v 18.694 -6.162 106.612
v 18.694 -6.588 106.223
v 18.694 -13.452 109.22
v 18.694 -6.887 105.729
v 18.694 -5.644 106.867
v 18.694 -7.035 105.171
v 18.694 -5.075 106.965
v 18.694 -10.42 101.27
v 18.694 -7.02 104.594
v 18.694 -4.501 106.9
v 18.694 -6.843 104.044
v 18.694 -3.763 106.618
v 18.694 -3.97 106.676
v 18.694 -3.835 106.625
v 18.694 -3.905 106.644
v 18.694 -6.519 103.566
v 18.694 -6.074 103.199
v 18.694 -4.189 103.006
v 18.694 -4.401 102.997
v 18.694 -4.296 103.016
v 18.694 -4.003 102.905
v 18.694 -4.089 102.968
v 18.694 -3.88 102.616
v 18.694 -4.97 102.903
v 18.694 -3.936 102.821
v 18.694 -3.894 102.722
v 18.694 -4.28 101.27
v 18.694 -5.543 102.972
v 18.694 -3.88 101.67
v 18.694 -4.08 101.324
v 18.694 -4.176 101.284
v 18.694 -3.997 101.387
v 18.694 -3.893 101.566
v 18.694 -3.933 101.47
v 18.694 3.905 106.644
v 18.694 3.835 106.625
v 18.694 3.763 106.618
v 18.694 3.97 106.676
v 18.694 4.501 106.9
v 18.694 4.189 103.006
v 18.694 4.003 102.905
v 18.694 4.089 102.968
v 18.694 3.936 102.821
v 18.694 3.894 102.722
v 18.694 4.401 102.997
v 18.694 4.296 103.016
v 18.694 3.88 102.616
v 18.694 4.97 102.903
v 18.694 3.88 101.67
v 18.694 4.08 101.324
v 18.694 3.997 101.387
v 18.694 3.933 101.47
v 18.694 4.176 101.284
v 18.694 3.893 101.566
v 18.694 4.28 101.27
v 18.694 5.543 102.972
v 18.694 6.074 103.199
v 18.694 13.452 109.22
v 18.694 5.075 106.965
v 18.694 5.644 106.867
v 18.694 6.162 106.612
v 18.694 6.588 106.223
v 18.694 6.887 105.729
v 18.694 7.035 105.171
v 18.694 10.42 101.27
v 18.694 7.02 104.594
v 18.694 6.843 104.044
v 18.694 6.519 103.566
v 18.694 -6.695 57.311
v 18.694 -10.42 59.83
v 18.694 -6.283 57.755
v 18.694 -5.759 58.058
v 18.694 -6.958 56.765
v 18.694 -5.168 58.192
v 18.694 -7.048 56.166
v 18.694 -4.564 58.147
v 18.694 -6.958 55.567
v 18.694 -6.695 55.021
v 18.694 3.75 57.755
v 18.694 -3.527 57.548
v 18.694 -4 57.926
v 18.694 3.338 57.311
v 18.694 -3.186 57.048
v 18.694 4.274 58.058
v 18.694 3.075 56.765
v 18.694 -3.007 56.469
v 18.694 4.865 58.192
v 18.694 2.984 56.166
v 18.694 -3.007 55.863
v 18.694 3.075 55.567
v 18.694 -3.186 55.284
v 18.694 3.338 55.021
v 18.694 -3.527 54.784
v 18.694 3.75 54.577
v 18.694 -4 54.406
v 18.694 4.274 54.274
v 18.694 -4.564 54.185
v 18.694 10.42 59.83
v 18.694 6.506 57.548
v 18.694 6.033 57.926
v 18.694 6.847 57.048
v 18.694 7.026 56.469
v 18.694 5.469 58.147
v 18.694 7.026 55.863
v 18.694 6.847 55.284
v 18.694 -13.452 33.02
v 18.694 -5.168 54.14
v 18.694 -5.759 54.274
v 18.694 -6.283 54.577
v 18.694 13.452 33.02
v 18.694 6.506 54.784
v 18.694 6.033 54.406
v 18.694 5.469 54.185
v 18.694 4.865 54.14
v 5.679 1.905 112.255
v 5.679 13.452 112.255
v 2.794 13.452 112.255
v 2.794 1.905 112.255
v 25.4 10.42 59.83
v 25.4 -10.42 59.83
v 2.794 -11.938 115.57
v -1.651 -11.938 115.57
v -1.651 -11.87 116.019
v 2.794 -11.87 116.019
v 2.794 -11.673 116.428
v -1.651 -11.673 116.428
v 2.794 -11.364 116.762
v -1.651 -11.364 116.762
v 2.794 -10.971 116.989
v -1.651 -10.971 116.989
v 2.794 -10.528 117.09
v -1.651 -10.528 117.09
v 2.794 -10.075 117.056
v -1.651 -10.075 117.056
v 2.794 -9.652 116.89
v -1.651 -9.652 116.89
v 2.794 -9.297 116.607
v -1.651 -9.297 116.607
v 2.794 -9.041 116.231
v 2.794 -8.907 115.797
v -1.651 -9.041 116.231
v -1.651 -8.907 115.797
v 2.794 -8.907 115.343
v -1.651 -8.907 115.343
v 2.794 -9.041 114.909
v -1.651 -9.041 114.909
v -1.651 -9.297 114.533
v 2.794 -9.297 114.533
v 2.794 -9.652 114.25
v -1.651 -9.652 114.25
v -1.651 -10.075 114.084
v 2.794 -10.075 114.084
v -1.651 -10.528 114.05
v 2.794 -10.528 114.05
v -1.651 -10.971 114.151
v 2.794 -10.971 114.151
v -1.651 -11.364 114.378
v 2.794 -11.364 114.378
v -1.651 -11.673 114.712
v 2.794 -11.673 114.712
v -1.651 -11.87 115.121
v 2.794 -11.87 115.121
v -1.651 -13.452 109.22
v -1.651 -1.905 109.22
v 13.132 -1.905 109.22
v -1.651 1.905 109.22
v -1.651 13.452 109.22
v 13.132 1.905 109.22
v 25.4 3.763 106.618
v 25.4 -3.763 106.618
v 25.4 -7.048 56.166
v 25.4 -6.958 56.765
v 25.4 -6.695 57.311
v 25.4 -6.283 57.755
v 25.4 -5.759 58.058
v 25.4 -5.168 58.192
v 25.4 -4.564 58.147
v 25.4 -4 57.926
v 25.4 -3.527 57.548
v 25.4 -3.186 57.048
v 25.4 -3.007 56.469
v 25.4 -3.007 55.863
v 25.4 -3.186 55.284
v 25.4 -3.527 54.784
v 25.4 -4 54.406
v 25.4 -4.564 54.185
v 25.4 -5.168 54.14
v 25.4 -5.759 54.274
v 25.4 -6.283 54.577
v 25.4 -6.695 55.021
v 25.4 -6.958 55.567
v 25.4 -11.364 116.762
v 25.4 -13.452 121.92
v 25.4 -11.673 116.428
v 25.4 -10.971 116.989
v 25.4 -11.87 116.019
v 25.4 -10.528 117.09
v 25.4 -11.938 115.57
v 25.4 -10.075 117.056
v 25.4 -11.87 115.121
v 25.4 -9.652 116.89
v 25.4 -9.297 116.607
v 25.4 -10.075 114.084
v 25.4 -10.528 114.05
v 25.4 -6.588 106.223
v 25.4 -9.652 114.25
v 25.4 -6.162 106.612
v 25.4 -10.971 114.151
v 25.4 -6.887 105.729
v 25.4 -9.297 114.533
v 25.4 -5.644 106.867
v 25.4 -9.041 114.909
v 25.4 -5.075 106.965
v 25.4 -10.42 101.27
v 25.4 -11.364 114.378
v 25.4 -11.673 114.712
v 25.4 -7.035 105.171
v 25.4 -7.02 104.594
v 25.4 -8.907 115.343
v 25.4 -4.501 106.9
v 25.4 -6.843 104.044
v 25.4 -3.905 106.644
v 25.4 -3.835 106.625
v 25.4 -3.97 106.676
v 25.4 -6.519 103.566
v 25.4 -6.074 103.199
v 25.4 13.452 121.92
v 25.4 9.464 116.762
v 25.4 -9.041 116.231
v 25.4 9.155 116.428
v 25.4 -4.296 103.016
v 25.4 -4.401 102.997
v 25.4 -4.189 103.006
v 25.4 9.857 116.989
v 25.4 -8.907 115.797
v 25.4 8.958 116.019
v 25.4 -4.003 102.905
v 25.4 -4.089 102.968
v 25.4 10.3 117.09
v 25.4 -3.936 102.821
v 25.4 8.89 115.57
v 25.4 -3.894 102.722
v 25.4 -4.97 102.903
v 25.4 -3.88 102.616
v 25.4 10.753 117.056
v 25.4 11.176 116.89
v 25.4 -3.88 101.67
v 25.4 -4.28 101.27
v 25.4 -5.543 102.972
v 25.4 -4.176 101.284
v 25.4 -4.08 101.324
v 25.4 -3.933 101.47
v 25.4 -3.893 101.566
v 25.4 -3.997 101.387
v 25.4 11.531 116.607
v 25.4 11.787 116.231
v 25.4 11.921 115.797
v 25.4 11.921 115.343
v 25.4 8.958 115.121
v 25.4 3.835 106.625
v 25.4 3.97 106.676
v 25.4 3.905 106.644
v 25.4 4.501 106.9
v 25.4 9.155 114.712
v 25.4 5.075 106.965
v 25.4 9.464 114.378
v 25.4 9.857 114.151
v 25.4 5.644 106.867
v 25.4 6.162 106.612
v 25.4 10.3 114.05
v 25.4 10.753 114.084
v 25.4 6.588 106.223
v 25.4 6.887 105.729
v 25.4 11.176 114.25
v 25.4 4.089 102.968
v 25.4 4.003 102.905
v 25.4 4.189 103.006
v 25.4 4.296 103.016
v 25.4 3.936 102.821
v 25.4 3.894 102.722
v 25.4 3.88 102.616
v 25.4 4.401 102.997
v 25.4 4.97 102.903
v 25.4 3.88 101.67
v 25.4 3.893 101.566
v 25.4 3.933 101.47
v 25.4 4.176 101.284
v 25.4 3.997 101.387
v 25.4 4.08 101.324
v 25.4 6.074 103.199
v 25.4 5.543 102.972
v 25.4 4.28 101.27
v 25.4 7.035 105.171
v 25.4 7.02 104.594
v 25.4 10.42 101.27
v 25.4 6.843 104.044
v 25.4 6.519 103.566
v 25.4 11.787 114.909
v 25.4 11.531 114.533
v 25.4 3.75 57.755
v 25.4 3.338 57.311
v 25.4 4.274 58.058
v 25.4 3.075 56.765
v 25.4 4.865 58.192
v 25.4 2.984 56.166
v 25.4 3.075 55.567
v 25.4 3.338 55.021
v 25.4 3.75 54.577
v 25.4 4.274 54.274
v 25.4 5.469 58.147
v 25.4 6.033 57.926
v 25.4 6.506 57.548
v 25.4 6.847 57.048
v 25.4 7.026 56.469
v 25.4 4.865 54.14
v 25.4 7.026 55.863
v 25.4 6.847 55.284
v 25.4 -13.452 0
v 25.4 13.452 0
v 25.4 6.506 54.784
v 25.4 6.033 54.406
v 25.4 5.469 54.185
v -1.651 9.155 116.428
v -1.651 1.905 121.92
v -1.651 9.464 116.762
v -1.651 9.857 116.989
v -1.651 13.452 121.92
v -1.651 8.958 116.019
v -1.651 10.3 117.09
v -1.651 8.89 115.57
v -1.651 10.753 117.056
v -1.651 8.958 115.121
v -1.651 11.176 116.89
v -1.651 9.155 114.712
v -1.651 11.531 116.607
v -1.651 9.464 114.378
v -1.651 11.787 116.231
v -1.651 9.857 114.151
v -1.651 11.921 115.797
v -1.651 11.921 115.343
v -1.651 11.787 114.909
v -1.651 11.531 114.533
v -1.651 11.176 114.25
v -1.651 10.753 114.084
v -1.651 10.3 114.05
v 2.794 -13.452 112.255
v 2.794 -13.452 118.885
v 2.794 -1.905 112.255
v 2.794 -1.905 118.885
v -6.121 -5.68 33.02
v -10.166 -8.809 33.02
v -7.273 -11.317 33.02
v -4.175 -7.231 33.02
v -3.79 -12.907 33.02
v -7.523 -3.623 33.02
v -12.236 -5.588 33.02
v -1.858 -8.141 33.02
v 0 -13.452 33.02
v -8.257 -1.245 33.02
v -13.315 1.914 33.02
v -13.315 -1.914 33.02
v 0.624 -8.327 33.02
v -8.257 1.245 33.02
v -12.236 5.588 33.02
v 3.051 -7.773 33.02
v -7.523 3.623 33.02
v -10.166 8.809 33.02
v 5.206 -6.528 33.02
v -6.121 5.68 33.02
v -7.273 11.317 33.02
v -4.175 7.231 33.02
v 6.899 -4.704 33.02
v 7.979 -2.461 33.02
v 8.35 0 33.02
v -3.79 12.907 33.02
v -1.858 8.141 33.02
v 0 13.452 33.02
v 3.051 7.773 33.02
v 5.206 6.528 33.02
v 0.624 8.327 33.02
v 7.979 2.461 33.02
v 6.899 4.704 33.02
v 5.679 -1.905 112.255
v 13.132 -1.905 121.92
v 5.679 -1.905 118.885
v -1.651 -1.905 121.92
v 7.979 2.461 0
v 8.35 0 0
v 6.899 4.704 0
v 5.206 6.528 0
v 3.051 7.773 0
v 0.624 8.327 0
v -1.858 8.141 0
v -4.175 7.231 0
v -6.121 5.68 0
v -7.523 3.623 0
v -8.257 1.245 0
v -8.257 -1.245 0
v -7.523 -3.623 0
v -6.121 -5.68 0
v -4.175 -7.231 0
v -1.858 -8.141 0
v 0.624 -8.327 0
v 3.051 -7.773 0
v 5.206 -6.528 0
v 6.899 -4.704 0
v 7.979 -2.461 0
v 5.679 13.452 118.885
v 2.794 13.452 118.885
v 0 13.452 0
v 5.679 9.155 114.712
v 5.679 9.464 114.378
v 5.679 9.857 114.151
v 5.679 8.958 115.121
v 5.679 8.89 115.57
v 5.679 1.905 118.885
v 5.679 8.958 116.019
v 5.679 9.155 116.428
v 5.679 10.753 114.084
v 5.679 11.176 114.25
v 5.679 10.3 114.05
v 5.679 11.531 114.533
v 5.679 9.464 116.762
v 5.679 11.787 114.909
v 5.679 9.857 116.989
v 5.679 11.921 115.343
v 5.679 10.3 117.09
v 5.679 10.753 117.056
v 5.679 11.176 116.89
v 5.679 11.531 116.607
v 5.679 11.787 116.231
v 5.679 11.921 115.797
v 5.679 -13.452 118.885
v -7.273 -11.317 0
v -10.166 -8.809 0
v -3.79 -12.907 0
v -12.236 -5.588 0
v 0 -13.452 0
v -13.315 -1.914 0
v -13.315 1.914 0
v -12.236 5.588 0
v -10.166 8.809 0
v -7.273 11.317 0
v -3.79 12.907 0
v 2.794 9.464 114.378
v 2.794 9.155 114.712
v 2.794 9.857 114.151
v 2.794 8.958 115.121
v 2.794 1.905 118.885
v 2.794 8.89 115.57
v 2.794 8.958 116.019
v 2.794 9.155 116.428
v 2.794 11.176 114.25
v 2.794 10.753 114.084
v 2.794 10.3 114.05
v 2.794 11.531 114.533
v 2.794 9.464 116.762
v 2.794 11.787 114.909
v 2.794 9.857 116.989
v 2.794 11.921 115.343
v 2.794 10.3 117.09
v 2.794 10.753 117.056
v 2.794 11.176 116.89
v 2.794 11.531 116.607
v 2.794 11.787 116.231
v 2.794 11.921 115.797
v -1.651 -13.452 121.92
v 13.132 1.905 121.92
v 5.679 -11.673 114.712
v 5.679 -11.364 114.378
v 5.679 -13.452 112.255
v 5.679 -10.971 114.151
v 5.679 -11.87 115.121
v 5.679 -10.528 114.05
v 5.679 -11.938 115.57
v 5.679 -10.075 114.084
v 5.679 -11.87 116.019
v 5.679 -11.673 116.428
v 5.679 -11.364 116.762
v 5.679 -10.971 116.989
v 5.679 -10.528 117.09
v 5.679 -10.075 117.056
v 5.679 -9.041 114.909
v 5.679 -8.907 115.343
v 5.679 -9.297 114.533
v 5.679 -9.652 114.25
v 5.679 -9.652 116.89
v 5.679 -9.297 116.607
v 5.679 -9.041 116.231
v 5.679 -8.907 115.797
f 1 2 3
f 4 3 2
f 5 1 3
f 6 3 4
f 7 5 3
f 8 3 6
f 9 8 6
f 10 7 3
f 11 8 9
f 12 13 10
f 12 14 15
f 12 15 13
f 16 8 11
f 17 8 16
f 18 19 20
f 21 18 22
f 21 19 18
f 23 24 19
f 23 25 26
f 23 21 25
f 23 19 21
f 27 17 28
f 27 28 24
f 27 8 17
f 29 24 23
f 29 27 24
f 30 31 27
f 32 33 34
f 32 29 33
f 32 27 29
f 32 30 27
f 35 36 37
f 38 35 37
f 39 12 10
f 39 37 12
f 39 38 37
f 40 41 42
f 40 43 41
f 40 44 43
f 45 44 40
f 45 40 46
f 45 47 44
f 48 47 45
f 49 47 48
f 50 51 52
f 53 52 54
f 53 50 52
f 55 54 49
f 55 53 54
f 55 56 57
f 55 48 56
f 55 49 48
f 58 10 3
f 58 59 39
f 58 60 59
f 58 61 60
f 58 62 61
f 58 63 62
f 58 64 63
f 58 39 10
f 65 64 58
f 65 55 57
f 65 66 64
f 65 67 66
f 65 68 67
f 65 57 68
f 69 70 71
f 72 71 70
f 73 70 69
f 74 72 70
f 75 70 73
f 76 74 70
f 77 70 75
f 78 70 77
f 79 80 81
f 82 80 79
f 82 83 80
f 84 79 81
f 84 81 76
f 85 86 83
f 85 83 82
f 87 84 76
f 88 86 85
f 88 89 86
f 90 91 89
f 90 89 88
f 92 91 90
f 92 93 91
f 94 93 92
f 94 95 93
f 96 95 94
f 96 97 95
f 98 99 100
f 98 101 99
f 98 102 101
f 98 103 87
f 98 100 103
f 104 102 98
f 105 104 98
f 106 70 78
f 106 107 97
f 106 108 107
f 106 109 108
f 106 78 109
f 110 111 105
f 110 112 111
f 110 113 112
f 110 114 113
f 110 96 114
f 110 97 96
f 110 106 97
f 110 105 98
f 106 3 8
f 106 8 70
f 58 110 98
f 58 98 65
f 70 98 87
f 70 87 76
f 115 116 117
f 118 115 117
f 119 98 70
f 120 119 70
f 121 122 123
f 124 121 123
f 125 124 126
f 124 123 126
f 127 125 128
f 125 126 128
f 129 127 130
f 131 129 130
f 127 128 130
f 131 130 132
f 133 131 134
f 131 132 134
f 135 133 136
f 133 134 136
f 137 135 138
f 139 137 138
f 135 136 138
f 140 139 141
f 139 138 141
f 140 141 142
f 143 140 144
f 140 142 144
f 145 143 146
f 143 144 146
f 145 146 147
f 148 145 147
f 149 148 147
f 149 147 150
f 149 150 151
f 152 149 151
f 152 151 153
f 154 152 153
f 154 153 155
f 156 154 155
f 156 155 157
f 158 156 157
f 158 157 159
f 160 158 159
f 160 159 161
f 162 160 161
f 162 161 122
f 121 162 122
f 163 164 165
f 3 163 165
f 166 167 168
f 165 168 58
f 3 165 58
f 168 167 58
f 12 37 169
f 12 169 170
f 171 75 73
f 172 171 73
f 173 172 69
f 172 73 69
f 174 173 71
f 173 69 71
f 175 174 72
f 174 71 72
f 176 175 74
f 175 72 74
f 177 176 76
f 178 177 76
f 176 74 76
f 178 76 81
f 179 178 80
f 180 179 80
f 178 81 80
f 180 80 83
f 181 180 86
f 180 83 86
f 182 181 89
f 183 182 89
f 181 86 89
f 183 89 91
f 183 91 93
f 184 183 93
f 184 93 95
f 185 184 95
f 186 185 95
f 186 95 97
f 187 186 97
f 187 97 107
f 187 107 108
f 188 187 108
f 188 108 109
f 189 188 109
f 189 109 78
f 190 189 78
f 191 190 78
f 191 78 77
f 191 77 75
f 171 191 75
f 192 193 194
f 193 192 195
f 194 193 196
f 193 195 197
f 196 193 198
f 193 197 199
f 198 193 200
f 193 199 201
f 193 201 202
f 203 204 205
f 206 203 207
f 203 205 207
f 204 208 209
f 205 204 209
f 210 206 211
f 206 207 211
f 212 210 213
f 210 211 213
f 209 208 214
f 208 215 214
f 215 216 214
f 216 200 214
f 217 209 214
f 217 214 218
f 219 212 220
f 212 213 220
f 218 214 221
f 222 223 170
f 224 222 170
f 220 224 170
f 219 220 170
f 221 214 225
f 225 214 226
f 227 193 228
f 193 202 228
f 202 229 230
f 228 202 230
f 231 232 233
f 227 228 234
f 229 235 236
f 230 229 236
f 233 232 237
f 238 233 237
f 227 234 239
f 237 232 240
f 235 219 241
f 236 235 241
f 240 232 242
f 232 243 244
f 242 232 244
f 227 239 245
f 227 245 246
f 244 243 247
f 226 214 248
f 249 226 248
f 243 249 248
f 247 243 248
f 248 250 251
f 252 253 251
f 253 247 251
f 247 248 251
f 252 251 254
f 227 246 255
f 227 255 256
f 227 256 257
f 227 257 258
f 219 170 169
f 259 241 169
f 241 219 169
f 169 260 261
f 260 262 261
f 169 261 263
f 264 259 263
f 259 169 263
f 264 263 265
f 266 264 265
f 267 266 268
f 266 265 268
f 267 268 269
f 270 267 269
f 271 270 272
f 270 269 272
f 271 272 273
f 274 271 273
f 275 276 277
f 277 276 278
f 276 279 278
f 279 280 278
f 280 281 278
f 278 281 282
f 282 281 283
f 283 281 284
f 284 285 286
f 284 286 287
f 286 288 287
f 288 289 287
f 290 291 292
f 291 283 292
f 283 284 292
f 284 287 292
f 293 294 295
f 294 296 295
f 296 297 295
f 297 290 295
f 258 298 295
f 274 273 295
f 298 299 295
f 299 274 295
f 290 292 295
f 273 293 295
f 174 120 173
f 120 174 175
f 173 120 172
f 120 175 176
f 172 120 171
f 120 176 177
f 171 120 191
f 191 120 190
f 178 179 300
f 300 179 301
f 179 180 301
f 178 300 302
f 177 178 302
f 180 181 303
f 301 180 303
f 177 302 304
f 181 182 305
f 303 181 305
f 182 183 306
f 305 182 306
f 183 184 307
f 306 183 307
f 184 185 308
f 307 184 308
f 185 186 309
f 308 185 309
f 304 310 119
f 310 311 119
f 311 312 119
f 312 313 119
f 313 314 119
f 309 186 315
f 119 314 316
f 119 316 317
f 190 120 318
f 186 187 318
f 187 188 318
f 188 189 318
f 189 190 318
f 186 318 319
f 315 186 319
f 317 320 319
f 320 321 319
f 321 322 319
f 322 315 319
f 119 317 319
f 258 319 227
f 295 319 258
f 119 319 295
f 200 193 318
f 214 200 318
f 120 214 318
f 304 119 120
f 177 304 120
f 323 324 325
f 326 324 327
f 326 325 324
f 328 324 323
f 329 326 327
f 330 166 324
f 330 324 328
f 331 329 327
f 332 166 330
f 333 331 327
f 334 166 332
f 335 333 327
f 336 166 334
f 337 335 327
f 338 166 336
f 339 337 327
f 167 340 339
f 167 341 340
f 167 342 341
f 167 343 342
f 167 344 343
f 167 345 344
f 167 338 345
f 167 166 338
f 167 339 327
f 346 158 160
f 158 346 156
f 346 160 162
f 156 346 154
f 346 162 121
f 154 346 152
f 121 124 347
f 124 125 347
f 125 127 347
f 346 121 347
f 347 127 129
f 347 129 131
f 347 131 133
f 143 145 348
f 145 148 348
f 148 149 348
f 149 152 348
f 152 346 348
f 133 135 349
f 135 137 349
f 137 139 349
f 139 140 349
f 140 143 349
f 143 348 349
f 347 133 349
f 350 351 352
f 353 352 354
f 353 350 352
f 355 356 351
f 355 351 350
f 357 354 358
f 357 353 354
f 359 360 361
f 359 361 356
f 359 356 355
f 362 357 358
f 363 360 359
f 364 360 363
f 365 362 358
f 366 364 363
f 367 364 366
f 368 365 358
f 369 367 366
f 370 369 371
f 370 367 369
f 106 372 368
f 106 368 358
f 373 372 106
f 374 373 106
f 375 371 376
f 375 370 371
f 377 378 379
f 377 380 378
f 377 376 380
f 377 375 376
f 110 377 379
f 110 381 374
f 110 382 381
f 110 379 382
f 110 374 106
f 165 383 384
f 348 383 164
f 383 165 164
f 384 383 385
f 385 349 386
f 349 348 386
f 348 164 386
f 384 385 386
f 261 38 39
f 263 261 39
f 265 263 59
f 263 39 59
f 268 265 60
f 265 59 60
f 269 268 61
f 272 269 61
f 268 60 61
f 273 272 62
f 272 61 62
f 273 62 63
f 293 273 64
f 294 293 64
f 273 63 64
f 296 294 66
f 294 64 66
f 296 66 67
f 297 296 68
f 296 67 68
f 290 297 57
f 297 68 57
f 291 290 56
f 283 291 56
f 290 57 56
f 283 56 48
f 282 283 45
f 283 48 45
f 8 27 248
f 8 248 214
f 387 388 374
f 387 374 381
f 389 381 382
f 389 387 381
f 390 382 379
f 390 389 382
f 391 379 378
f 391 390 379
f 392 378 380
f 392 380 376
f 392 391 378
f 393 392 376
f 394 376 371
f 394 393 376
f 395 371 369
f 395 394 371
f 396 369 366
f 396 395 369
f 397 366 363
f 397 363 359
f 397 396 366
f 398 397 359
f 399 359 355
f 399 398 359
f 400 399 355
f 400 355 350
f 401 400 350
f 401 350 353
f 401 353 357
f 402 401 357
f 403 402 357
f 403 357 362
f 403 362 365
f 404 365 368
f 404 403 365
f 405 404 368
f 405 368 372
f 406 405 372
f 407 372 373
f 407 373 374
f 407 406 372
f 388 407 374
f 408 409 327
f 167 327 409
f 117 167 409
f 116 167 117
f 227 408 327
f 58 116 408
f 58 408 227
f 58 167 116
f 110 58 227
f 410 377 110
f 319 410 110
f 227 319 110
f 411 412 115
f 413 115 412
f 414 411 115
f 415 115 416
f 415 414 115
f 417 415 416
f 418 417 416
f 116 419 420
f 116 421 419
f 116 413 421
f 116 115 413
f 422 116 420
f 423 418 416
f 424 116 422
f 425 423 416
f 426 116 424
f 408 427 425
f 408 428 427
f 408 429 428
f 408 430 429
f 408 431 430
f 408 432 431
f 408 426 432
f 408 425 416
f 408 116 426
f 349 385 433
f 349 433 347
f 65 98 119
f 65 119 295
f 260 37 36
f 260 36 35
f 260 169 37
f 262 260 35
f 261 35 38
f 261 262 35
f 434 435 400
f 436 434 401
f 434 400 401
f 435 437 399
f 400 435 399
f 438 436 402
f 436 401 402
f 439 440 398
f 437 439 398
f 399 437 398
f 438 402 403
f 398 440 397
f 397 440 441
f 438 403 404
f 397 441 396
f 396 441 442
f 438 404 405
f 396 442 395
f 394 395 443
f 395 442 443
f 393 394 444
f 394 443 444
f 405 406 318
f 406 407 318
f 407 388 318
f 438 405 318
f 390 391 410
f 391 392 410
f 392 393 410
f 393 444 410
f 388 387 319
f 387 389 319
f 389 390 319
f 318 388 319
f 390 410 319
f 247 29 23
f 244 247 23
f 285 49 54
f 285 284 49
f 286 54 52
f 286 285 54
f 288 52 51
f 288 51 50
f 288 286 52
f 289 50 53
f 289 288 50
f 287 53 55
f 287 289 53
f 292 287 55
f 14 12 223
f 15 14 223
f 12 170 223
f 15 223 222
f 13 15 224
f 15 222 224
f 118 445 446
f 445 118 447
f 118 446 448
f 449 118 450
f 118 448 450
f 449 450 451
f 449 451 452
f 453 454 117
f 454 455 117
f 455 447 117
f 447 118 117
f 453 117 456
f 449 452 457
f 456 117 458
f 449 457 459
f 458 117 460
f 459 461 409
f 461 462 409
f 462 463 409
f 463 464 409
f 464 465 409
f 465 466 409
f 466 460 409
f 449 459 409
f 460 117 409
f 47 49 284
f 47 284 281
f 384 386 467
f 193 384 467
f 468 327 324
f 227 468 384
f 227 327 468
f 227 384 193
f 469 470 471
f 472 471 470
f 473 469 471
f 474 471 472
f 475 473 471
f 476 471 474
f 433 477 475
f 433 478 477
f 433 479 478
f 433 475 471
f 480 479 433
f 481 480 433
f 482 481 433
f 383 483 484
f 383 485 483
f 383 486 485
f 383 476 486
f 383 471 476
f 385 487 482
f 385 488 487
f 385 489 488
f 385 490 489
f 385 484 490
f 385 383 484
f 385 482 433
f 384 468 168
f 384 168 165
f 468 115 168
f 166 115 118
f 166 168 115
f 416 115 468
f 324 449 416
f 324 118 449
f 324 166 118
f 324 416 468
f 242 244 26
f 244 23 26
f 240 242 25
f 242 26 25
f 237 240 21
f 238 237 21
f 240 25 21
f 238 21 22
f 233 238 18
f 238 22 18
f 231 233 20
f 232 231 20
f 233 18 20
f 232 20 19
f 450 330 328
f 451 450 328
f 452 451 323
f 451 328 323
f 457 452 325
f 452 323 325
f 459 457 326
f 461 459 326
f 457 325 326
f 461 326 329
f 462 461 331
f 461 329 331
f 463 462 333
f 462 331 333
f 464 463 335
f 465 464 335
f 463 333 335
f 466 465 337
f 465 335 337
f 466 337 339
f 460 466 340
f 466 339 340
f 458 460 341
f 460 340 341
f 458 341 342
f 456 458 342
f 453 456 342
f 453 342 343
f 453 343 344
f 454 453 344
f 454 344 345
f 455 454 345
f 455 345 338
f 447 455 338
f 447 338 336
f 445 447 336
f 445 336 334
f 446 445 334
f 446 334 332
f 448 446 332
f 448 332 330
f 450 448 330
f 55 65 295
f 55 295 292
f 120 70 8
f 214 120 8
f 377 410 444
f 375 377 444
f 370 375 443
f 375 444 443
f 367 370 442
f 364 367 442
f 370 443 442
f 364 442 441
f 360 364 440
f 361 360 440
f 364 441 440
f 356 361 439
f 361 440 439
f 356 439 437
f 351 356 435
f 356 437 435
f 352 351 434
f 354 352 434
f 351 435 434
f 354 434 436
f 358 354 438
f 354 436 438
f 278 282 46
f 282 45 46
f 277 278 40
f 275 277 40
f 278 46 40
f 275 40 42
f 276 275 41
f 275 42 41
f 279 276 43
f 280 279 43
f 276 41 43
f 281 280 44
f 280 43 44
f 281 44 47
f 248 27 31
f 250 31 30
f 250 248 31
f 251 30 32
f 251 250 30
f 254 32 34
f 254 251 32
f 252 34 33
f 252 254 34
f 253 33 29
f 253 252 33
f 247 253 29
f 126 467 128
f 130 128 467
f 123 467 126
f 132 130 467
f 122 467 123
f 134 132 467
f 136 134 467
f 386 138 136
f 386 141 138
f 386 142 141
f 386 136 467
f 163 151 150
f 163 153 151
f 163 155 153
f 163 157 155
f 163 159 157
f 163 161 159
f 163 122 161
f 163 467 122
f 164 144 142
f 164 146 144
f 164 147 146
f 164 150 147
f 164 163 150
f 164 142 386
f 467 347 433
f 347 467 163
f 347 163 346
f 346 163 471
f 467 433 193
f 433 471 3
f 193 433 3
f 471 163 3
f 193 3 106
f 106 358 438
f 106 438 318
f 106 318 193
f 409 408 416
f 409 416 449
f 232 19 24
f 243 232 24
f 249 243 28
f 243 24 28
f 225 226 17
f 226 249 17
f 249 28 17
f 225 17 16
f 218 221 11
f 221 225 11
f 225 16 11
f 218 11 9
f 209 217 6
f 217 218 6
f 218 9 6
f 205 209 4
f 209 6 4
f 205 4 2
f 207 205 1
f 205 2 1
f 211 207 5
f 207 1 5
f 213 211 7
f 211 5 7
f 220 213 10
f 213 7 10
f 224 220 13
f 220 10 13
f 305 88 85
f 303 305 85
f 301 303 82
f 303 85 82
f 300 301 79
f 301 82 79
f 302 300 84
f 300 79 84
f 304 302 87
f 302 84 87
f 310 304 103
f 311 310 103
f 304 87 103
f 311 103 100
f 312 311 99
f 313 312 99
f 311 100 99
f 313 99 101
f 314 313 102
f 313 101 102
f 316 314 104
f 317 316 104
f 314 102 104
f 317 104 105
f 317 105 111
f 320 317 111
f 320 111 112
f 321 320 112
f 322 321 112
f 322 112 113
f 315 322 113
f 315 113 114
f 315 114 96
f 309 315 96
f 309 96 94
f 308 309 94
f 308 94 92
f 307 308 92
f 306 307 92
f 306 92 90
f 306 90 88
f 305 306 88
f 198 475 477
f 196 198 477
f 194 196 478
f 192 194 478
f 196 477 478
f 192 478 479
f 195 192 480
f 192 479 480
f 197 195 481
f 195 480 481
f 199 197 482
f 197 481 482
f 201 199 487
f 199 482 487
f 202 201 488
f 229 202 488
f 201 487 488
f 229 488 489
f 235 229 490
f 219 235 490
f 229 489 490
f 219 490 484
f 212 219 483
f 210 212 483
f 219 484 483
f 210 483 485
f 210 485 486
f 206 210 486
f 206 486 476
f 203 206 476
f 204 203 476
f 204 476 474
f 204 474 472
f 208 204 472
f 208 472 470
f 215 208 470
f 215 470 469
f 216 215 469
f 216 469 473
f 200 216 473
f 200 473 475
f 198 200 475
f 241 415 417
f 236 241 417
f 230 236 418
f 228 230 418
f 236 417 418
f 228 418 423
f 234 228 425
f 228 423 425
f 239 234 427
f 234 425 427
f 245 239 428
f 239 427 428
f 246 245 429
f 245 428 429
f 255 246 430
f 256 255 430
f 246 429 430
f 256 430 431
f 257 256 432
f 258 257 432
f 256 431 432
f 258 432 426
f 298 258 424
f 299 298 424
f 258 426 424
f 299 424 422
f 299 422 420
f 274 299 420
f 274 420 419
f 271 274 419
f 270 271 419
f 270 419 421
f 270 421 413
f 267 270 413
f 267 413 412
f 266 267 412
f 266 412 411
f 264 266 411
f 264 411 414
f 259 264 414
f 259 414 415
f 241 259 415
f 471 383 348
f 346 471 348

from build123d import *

# Parameters (mm, degrees)
F0_R      = 8.3502
F1_DEPTH  = 33.02
F2_W      = 6.7056
F2_H      = 26.9042
F3_DEPTH  = 76.2
F4_W      = 20.8406
F4_H      = 41.44
F4_R      = 2.032
F5_DEPTH  = 25.4
F6_W      = 7.7596
F6_H      = 5.3483209641
F7_DEPTH  = 25.4
F8_R      = 0.4
F9_W      = 27.051
F9_H      = 26.9042
F10_DEPTH = 12.7
F11_W     = 3.81
F11_H     = 12.7
F11_R     = 1.524
F12_DEPTH = 14.7828
F13_DEPTH = 12.7
F14_W     = 2.88544
F14_H     = 6.6294
F15_DEPTH = 26.9052


with BuildPart() as f1:
    # F0 (on Top) → F1 (new body)
    with BuildSketch(Plane.XY):
        with BuildLine():
            Line((25.4, 13.4521), (0, 13.4521))
            ThreePointArc((0, 13.4521), (-13.4521, 0), (0, -13.4521))
            Line((0, -13.4521), (25.4, -13.4521))
            Line((25.4, -13.4521), (25.4, 13.4521))
        make_face()
        Circle(F0_R, mode=Mode.SUBTRACT)
    extrude(amount=F1_DEPTH)

    # F2 (on face) → F3 (join)
    with BuildSketch(Plane.XY.offset(33.02)):
        with Locations((22.0472, 0)):
            Rectangle(F2_W, F2_H)
    extrude(amount=F3_DEPTH)

    # F4 (on face) → F5 (cut)
    with BuildSketch(Plane(origin=(18.6944, 0, 0), x_dir=(0, -1, 0), z_dir=(-1, 0, 0))):
        with Locations((0, 80.55)):
            Rectangle(F4_W, F4_H)
        with Locations((-5.0165, 104.934)):
            Circle(F4_R)
        with Locations((-5.0165, 56.166)):
            Circle(F4_R)
        with Locations((5.0165, 56.166)):
            Circle(F4_R)
        with Locations((5.0165, 104.934)):
            Circle(F4_R)
    extrude(amount=-F5_DEPTH, mode=Mode.SUBTRACT)

    # F6 (on face) → F7 (cut)
    with BuildSketch(Plane(origin=(18.6944, 0, 0), x_dir=(0, -1, 0), z_dir=(-1, 0, 0))):
        with Locations((0, 103.944160482)):
            Rectangle(F6_W, F6_H)
    extrude(amount=-F7_DEPTH, mode=Mode.SUBTRACT)

    # F8
    f8_edges = [f1.edges().sort_by_distance(p)[0] for p in [
        (22.0472, 3.8798, 103.249679),
        (22.0472, -3.8798, 103.249679),
        (22.0472, 3.8798, 101.27),
        (22.0472, -3.8798, 101.27),
        (22.0472, 3.8798, 106.618321),
        (22.0472, -3.8798, 106.618321),
    ]]
    fillet(f8_edges, radius=F8_R)

    # F9 (on face) → F10 (join)
    with BuildSketch(Plane.XY.offset(109.22)):
        with Locations((11.8745, 0)):
            Rectangle(F9_W, F9_H)
    extrude(amount=F10_DEPTH)

    # F11 (on face) → F12 (cut)
    with BuildSketch(Plane(origin=(-1.651, 0, 0), x_dir=(0, -1, 0), z_dir=(-1, 0, 0))):
        with Locations((0, 115.57)):
            Rectangle(F11_W, F11_H)
        with Locations((-10.414, 115.57)):
            Circle(F11_R)
        with Locations((10.414, 115.57)):
            Circle(F11_R)
    extrude(amount=-F12_DEPTH, mode=Mode.SUBTRACT)

    # F13 (cut): faces of the model
    f13_faces = [f1.faces().sort_by_distance(p)[0] for p in [
        (13.1318, 10.414, 115.57),
        (13.1318, -10.414, 115.57),
    ]]
    extrude(f13_faces, amount=-F13_DEPTH, mode=Mode.SUBTRACT)

    # F14 (on face) → F15 (cut, through all)
    with BuildSketch(Plane(origin=(0, 13.4521, 0), x_dir=(-1, 0, 0), z_dir=(0, 1, 0))):
        with Locations((-4.23672, 115.57)):
            Rectangle(F14_W, F14_H)
    extrude(amount=-F15_DEPTH, mode=Mode.SUBTRACT)


solid = f1.part
